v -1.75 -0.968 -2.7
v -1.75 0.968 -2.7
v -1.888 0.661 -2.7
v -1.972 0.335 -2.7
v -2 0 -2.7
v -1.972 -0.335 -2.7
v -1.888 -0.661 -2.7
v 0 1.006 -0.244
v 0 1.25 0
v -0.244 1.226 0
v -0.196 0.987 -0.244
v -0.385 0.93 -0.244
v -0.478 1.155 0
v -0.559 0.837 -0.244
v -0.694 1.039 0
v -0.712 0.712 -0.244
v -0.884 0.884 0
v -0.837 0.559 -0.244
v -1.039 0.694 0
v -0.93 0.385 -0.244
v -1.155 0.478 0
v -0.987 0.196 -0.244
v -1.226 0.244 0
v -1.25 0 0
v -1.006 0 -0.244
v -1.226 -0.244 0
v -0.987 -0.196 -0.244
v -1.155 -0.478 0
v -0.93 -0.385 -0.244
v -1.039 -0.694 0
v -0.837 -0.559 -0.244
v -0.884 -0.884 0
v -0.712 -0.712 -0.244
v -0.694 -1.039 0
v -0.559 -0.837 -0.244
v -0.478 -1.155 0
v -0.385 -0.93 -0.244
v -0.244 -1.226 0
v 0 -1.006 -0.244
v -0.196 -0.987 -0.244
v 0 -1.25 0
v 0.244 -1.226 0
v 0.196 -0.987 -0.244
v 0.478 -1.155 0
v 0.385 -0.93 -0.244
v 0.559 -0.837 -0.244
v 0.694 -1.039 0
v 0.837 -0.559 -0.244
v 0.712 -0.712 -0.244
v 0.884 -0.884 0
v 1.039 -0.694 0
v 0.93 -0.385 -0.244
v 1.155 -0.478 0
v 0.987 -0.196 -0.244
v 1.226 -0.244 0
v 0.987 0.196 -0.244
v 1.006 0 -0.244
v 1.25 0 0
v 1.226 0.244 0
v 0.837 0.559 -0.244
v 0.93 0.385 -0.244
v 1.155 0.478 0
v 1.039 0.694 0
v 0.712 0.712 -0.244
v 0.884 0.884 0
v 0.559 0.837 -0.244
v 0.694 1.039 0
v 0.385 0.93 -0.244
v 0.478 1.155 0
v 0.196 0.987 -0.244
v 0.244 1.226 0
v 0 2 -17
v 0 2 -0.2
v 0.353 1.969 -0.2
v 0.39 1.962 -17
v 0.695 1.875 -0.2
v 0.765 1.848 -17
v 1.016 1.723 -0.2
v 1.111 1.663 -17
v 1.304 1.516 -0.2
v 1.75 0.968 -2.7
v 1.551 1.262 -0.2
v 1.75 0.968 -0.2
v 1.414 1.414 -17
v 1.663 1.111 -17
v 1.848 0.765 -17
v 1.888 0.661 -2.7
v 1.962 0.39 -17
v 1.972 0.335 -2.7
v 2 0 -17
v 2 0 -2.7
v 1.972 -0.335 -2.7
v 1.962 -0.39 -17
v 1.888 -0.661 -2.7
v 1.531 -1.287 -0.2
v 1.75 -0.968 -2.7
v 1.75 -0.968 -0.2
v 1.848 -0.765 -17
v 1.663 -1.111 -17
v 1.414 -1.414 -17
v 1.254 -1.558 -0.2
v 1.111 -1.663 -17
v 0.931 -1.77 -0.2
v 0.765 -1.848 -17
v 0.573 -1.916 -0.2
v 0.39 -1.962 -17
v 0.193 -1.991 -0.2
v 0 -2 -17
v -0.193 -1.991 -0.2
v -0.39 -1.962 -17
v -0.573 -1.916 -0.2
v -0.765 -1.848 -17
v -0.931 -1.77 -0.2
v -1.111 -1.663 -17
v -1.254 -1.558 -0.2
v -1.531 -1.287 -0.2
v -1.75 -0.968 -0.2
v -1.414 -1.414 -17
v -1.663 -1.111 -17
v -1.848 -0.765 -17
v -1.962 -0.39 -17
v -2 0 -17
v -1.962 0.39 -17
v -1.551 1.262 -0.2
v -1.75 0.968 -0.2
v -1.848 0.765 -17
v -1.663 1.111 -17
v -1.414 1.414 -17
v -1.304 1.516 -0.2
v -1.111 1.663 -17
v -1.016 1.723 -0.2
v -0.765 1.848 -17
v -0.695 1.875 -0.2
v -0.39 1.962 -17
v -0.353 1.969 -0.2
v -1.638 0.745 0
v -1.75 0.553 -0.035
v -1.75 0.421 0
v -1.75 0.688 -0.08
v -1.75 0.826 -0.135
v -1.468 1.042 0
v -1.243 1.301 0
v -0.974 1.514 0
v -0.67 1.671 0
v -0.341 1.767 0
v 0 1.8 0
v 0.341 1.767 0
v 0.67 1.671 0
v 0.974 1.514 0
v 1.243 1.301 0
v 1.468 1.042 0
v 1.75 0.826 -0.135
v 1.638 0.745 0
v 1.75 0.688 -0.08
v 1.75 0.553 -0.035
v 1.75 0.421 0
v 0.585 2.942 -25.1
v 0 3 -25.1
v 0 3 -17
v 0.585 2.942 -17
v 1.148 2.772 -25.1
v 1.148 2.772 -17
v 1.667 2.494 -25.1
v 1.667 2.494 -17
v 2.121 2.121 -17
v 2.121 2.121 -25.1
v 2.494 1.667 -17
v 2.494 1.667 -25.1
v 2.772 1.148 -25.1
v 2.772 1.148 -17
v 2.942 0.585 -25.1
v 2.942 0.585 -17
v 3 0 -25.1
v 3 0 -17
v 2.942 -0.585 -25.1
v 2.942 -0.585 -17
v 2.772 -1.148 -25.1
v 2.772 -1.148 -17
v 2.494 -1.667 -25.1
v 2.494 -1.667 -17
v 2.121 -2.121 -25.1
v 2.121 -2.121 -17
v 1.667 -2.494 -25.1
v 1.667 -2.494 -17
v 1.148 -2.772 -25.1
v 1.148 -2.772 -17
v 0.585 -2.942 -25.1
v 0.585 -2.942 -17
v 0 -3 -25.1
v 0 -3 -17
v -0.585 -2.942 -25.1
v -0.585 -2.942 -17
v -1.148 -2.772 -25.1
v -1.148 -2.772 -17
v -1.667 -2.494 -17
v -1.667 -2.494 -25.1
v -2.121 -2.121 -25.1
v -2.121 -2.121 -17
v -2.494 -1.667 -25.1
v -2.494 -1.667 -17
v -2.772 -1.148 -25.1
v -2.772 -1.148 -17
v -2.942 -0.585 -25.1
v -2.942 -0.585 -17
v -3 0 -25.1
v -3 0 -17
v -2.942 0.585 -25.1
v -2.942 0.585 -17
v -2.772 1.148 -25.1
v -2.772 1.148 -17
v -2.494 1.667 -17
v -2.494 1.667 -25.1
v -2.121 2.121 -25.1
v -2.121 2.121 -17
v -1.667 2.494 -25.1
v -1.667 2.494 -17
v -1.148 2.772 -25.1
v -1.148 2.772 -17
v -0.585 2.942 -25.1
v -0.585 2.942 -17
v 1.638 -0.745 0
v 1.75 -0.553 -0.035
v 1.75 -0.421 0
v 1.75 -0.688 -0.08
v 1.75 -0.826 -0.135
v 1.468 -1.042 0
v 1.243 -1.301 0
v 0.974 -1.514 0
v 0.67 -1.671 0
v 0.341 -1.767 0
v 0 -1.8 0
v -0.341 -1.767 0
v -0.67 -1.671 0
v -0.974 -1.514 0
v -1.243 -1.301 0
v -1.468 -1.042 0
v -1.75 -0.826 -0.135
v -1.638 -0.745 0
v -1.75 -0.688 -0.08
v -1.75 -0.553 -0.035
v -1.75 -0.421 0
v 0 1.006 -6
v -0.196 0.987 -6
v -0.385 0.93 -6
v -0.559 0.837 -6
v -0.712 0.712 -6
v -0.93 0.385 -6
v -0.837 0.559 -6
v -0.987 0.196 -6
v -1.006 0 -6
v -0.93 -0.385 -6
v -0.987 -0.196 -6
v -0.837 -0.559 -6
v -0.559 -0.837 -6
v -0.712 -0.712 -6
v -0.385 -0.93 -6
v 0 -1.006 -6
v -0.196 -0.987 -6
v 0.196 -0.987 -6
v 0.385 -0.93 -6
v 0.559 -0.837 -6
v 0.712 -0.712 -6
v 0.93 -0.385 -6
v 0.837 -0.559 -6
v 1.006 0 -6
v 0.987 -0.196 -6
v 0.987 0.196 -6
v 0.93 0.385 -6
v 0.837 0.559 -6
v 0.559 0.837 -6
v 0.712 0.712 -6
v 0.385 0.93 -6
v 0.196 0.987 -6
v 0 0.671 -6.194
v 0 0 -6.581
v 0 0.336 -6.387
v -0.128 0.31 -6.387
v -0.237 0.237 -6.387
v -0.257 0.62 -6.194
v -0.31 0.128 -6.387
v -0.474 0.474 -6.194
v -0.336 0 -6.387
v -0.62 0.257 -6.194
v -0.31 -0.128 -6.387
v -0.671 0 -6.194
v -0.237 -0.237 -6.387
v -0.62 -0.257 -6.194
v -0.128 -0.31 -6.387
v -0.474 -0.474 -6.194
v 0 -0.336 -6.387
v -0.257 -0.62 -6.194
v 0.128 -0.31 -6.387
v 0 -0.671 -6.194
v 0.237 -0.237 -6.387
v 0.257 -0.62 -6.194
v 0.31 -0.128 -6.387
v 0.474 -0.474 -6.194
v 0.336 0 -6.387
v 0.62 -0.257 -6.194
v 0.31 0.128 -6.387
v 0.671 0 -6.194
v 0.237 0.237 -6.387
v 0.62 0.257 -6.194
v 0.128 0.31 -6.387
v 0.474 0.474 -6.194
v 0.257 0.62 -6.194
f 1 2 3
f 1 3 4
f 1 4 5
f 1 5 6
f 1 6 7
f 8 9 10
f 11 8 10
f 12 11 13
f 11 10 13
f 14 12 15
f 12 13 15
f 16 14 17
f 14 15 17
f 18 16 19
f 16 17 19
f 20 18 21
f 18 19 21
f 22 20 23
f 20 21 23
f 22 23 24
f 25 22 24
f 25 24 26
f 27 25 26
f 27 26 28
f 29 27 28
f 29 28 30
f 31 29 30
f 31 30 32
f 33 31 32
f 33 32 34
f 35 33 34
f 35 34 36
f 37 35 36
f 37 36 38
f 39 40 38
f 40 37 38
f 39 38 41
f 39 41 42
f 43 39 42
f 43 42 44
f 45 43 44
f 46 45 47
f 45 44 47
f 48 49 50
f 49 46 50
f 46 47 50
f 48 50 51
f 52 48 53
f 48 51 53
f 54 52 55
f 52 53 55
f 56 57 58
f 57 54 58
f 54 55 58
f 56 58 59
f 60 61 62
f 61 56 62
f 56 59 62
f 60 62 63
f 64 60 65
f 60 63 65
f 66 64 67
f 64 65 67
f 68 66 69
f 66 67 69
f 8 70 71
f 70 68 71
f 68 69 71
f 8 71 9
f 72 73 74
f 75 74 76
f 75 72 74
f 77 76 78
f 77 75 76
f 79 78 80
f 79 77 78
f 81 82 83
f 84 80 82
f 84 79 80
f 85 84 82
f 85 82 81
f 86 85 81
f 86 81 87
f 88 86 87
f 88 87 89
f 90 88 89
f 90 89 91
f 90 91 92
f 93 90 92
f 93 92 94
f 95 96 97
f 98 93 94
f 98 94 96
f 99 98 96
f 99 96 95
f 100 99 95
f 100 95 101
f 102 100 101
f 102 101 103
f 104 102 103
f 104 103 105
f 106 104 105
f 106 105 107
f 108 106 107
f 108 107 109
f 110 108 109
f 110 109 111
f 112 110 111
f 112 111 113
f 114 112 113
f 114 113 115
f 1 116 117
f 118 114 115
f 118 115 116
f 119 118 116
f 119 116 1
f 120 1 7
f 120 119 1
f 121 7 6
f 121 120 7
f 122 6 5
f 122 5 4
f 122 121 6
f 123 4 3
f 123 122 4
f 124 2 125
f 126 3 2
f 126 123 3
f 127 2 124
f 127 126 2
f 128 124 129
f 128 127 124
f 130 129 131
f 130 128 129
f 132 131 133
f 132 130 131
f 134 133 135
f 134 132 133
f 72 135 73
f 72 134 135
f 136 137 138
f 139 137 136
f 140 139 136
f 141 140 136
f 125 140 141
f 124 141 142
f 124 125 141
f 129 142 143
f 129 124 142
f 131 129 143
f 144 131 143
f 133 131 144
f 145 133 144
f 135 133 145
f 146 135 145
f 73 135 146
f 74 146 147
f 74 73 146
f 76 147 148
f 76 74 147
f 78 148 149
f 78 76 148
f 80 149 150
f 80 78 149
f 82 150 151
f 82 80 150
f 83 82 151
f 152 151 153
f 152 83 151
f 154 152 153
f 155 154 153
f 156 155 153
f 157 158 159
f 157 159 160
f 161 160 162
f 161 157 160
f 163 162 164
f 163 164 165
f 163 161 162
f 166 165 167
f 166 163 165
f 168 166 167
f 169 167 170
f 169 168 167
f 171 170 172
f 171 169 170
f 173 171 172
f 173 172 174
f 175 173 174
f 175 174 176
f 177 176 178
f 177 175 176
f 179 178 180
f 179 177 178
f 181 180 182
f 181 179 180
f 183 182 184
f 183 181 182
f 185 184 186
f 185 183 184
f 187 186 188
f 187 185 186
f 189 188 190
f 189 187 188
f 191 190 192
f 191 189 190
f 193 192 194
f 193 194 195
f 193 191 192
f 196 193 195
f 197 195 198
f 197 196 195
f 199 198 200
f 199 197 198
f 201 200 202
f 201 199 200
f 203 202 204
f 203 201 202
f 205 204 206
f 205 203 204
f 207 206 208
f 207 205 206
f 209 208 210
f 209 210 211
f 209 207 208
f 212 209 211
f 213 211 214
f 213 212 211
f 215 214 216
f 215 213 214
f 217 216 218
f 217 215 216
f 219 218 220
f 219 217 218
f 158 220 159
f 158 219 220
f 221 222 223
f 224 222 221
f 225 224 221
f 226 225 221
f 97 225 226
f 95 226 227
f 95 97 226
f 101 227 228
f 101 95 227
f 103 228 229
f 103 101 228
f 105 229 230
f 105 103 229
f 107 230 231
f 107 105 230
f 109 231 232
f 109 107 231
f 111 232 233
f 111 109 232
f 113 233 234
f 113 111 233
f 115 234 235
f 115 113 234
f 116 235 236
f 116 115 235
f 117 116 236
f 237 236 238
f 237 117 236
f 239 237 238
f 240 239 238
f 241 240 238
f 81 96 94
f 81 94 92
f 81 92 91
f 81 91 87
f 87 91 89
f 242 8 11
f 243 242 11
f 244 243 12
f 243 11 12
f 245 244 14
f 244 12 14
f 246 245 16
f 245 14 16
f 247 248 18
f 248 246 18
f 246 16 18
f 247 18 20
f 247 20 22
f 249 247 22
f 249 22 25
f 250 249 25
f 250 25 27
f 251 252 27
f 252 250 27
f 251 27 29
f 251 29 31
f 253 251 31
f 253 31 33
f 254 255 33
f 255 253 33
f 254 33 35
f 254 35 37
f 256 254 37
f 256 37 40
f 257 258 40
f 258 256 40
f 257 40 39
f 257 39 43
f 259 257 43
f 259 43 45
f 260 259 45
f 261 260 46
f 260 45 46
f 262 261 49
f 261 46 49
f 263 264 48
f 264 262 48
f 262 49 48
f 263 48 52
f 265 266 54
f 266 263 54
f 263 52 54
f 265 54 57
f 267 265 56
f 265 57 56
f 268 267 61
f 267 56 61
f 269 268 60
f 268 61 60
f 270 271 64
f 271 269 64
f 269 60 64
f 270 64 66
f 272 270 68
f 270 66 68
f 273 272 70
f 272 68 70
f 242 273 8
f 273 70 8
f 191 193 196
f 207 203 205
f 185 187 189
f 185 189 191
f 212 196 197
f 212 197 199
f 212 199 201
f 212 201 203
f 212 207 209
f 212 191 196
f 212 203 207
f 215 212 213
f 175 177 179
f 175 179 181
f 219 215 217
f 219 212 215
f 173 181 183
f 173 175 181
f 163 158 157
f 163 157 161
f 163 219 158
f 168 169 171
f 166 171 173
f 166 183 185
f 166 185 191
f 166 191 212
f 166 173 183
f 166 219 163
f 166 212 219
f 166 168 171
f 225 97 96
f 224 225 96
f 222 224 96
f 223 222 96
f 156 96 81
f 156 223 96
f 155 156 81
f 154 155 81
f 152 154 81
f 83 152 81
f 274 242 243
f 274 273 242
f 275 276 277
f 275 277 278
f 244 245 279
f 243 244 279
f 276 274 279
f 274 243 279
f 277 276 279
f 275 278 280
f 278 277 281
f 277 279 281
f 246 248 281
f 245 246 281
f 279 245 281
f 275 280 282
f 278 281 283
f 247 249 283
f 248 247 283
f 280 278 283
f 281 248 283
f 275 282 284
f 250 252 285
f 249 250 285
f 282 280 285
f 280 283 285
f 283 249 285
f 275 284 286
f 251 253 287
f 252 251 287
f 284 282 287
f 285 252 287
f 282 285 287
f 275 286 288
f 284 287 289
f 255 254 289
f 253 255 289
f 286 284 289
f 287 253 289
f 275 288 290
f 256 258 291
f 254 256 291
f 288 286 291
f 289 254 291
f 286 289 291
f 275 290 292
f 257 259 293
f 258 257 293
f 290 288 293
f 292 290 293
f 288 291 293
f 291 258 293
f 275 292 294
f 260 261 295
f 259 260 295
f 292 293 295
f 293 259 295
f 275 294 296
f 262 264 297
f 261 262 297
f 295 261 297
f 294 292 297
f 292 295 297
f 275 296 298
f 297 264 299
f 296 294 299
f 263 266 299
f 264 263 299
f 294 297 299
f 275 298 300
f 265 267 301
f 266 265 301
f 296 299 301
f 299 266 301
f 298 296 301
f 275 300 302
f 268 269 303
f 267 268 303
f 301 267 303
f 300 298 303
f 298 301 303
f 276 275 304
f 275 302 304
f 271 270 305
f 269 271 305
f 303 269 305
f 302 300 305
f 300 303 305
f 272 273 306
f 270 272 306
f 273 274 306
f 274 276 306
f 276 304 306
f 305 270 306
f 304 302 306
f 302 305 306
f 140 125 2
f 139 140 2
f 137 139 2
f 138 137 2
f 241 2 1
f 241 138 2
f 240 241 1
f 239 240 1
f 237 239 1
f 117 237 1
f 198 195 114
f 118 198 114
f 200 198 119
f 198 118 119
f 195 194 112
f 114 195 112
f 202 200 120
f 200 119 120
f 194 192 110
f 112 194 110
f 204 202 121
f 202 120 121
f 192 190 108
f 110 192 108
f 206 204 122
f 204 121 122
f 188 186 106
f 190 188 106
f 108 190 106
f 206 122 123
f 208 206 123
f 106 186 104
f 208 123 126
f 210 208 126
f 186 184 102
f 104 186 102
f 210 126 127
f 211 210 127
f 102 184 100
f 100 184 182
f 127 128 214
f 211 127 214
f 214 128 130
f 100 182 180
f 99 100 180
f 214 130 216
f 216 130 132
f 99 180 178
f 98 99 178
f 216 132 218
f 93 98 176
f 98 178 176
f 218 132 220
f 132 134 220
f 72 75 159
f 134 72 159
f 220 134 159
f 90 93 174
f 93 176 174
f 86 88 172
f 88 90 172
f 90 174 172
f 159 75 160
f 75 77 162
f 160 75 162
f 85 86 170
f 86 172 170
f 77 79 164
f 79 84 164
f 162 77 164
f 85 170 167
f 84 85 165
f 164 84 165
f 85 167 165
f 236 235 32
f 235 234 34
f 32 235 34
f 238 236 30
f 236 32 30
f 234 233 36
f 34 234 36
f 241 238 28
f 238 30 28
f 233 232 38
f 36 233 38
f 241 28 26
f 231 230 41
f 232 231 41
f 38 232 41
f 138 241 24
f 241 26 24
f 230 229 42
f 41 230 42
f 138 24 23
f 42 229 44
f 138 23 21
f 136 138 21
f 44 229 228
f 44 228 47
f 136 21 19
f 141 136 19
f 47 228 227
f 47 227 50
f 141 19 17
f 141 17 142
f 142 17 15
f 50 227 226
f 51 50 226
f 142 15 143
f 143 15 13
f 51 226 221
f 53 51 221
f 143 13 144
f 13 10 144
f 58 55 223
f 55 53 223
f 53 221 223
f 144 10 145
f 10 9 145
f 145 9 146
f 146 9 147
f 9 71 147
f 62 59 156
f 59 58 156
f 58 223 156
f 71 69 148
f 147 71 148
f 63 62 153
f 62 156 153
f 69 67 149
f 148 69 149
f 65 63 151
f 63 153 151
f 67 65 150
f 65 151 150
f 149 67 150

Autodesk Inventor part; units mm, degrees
sketch "Sketch_1" plane through (0, 0, 0) normal (1, 0, 0) x (0, 1, 0)
  line L0 (0, -25.1) -> (0, -6.5811)
  line L1 (0, -6.5811) -> (1.0065, -6)
  line L2 (1.0065, -6) -> (1.0065, -0.2435)
  line L3 (1.0065, -0.2435) -> (1.25, 0)
  line L4 (1.25, 0) -> (1.8, 0)
  line L5 (1.8, 0) -> (2, -0.2)
  line L6 (2, -0.2) -> (2, -17)
  line L7 (2, -17) -> (3, -17)
  line L8 (3, -17) -> (3, -25.1)
  line L9 (3, -25.1) -> (0, -25.1)
  line L10 (0, -25.1) -> (0, -6.5811)
revolve "Revolution1" add sketch "Sketch_1" angle 360 about axis through (0, 0, -25.1) along (0, 0, -1)
thread "Thread1" size "M2.5x0.45" class "6H" standard "ISO Metric profile" length 4.7565
sketch "Sketch_2" plane through (0, 0, 0) normal (0, 0, 1) x (1, 0, 0)
  line L0 (-3.5, 15) -> (-3.5, -15)
  line L1 (-3.5, -15) -> (3.5, -15)
  line L2 (3.5, -15) -> (3.5, 15)
  line L3 (3.5, 15) -> (-3.5, 15)
  line L4 (-1.75, 10) -> (-1.75, -10)
  line L5 (-1.75, -10) -> (1.75, -10)
  line L6 (1.75, -10) -> (1.75, 10)
  line L7 (1.75, 10) -> (-1.75, 10)
extrude "Extrusion1" cut sketch "Sketch_2" against normal blind 2.7
ref_plane "ANBAU_XY" through (0, 0, -25.1) normal (0, 0, -1) x (1, 0, 0)
ref_plane "ANBAU_YZ" through (0, 0, -25.1) normal (1, 0, 0) x (0, -1, 0)
ref_plane "ANBAU_ZX" through (0, 0, -25.1) normal (0, -1, 0) x (0, 0, -1)
properties part number "5267300 AEN-S-6-5-I-A---(highP)"
